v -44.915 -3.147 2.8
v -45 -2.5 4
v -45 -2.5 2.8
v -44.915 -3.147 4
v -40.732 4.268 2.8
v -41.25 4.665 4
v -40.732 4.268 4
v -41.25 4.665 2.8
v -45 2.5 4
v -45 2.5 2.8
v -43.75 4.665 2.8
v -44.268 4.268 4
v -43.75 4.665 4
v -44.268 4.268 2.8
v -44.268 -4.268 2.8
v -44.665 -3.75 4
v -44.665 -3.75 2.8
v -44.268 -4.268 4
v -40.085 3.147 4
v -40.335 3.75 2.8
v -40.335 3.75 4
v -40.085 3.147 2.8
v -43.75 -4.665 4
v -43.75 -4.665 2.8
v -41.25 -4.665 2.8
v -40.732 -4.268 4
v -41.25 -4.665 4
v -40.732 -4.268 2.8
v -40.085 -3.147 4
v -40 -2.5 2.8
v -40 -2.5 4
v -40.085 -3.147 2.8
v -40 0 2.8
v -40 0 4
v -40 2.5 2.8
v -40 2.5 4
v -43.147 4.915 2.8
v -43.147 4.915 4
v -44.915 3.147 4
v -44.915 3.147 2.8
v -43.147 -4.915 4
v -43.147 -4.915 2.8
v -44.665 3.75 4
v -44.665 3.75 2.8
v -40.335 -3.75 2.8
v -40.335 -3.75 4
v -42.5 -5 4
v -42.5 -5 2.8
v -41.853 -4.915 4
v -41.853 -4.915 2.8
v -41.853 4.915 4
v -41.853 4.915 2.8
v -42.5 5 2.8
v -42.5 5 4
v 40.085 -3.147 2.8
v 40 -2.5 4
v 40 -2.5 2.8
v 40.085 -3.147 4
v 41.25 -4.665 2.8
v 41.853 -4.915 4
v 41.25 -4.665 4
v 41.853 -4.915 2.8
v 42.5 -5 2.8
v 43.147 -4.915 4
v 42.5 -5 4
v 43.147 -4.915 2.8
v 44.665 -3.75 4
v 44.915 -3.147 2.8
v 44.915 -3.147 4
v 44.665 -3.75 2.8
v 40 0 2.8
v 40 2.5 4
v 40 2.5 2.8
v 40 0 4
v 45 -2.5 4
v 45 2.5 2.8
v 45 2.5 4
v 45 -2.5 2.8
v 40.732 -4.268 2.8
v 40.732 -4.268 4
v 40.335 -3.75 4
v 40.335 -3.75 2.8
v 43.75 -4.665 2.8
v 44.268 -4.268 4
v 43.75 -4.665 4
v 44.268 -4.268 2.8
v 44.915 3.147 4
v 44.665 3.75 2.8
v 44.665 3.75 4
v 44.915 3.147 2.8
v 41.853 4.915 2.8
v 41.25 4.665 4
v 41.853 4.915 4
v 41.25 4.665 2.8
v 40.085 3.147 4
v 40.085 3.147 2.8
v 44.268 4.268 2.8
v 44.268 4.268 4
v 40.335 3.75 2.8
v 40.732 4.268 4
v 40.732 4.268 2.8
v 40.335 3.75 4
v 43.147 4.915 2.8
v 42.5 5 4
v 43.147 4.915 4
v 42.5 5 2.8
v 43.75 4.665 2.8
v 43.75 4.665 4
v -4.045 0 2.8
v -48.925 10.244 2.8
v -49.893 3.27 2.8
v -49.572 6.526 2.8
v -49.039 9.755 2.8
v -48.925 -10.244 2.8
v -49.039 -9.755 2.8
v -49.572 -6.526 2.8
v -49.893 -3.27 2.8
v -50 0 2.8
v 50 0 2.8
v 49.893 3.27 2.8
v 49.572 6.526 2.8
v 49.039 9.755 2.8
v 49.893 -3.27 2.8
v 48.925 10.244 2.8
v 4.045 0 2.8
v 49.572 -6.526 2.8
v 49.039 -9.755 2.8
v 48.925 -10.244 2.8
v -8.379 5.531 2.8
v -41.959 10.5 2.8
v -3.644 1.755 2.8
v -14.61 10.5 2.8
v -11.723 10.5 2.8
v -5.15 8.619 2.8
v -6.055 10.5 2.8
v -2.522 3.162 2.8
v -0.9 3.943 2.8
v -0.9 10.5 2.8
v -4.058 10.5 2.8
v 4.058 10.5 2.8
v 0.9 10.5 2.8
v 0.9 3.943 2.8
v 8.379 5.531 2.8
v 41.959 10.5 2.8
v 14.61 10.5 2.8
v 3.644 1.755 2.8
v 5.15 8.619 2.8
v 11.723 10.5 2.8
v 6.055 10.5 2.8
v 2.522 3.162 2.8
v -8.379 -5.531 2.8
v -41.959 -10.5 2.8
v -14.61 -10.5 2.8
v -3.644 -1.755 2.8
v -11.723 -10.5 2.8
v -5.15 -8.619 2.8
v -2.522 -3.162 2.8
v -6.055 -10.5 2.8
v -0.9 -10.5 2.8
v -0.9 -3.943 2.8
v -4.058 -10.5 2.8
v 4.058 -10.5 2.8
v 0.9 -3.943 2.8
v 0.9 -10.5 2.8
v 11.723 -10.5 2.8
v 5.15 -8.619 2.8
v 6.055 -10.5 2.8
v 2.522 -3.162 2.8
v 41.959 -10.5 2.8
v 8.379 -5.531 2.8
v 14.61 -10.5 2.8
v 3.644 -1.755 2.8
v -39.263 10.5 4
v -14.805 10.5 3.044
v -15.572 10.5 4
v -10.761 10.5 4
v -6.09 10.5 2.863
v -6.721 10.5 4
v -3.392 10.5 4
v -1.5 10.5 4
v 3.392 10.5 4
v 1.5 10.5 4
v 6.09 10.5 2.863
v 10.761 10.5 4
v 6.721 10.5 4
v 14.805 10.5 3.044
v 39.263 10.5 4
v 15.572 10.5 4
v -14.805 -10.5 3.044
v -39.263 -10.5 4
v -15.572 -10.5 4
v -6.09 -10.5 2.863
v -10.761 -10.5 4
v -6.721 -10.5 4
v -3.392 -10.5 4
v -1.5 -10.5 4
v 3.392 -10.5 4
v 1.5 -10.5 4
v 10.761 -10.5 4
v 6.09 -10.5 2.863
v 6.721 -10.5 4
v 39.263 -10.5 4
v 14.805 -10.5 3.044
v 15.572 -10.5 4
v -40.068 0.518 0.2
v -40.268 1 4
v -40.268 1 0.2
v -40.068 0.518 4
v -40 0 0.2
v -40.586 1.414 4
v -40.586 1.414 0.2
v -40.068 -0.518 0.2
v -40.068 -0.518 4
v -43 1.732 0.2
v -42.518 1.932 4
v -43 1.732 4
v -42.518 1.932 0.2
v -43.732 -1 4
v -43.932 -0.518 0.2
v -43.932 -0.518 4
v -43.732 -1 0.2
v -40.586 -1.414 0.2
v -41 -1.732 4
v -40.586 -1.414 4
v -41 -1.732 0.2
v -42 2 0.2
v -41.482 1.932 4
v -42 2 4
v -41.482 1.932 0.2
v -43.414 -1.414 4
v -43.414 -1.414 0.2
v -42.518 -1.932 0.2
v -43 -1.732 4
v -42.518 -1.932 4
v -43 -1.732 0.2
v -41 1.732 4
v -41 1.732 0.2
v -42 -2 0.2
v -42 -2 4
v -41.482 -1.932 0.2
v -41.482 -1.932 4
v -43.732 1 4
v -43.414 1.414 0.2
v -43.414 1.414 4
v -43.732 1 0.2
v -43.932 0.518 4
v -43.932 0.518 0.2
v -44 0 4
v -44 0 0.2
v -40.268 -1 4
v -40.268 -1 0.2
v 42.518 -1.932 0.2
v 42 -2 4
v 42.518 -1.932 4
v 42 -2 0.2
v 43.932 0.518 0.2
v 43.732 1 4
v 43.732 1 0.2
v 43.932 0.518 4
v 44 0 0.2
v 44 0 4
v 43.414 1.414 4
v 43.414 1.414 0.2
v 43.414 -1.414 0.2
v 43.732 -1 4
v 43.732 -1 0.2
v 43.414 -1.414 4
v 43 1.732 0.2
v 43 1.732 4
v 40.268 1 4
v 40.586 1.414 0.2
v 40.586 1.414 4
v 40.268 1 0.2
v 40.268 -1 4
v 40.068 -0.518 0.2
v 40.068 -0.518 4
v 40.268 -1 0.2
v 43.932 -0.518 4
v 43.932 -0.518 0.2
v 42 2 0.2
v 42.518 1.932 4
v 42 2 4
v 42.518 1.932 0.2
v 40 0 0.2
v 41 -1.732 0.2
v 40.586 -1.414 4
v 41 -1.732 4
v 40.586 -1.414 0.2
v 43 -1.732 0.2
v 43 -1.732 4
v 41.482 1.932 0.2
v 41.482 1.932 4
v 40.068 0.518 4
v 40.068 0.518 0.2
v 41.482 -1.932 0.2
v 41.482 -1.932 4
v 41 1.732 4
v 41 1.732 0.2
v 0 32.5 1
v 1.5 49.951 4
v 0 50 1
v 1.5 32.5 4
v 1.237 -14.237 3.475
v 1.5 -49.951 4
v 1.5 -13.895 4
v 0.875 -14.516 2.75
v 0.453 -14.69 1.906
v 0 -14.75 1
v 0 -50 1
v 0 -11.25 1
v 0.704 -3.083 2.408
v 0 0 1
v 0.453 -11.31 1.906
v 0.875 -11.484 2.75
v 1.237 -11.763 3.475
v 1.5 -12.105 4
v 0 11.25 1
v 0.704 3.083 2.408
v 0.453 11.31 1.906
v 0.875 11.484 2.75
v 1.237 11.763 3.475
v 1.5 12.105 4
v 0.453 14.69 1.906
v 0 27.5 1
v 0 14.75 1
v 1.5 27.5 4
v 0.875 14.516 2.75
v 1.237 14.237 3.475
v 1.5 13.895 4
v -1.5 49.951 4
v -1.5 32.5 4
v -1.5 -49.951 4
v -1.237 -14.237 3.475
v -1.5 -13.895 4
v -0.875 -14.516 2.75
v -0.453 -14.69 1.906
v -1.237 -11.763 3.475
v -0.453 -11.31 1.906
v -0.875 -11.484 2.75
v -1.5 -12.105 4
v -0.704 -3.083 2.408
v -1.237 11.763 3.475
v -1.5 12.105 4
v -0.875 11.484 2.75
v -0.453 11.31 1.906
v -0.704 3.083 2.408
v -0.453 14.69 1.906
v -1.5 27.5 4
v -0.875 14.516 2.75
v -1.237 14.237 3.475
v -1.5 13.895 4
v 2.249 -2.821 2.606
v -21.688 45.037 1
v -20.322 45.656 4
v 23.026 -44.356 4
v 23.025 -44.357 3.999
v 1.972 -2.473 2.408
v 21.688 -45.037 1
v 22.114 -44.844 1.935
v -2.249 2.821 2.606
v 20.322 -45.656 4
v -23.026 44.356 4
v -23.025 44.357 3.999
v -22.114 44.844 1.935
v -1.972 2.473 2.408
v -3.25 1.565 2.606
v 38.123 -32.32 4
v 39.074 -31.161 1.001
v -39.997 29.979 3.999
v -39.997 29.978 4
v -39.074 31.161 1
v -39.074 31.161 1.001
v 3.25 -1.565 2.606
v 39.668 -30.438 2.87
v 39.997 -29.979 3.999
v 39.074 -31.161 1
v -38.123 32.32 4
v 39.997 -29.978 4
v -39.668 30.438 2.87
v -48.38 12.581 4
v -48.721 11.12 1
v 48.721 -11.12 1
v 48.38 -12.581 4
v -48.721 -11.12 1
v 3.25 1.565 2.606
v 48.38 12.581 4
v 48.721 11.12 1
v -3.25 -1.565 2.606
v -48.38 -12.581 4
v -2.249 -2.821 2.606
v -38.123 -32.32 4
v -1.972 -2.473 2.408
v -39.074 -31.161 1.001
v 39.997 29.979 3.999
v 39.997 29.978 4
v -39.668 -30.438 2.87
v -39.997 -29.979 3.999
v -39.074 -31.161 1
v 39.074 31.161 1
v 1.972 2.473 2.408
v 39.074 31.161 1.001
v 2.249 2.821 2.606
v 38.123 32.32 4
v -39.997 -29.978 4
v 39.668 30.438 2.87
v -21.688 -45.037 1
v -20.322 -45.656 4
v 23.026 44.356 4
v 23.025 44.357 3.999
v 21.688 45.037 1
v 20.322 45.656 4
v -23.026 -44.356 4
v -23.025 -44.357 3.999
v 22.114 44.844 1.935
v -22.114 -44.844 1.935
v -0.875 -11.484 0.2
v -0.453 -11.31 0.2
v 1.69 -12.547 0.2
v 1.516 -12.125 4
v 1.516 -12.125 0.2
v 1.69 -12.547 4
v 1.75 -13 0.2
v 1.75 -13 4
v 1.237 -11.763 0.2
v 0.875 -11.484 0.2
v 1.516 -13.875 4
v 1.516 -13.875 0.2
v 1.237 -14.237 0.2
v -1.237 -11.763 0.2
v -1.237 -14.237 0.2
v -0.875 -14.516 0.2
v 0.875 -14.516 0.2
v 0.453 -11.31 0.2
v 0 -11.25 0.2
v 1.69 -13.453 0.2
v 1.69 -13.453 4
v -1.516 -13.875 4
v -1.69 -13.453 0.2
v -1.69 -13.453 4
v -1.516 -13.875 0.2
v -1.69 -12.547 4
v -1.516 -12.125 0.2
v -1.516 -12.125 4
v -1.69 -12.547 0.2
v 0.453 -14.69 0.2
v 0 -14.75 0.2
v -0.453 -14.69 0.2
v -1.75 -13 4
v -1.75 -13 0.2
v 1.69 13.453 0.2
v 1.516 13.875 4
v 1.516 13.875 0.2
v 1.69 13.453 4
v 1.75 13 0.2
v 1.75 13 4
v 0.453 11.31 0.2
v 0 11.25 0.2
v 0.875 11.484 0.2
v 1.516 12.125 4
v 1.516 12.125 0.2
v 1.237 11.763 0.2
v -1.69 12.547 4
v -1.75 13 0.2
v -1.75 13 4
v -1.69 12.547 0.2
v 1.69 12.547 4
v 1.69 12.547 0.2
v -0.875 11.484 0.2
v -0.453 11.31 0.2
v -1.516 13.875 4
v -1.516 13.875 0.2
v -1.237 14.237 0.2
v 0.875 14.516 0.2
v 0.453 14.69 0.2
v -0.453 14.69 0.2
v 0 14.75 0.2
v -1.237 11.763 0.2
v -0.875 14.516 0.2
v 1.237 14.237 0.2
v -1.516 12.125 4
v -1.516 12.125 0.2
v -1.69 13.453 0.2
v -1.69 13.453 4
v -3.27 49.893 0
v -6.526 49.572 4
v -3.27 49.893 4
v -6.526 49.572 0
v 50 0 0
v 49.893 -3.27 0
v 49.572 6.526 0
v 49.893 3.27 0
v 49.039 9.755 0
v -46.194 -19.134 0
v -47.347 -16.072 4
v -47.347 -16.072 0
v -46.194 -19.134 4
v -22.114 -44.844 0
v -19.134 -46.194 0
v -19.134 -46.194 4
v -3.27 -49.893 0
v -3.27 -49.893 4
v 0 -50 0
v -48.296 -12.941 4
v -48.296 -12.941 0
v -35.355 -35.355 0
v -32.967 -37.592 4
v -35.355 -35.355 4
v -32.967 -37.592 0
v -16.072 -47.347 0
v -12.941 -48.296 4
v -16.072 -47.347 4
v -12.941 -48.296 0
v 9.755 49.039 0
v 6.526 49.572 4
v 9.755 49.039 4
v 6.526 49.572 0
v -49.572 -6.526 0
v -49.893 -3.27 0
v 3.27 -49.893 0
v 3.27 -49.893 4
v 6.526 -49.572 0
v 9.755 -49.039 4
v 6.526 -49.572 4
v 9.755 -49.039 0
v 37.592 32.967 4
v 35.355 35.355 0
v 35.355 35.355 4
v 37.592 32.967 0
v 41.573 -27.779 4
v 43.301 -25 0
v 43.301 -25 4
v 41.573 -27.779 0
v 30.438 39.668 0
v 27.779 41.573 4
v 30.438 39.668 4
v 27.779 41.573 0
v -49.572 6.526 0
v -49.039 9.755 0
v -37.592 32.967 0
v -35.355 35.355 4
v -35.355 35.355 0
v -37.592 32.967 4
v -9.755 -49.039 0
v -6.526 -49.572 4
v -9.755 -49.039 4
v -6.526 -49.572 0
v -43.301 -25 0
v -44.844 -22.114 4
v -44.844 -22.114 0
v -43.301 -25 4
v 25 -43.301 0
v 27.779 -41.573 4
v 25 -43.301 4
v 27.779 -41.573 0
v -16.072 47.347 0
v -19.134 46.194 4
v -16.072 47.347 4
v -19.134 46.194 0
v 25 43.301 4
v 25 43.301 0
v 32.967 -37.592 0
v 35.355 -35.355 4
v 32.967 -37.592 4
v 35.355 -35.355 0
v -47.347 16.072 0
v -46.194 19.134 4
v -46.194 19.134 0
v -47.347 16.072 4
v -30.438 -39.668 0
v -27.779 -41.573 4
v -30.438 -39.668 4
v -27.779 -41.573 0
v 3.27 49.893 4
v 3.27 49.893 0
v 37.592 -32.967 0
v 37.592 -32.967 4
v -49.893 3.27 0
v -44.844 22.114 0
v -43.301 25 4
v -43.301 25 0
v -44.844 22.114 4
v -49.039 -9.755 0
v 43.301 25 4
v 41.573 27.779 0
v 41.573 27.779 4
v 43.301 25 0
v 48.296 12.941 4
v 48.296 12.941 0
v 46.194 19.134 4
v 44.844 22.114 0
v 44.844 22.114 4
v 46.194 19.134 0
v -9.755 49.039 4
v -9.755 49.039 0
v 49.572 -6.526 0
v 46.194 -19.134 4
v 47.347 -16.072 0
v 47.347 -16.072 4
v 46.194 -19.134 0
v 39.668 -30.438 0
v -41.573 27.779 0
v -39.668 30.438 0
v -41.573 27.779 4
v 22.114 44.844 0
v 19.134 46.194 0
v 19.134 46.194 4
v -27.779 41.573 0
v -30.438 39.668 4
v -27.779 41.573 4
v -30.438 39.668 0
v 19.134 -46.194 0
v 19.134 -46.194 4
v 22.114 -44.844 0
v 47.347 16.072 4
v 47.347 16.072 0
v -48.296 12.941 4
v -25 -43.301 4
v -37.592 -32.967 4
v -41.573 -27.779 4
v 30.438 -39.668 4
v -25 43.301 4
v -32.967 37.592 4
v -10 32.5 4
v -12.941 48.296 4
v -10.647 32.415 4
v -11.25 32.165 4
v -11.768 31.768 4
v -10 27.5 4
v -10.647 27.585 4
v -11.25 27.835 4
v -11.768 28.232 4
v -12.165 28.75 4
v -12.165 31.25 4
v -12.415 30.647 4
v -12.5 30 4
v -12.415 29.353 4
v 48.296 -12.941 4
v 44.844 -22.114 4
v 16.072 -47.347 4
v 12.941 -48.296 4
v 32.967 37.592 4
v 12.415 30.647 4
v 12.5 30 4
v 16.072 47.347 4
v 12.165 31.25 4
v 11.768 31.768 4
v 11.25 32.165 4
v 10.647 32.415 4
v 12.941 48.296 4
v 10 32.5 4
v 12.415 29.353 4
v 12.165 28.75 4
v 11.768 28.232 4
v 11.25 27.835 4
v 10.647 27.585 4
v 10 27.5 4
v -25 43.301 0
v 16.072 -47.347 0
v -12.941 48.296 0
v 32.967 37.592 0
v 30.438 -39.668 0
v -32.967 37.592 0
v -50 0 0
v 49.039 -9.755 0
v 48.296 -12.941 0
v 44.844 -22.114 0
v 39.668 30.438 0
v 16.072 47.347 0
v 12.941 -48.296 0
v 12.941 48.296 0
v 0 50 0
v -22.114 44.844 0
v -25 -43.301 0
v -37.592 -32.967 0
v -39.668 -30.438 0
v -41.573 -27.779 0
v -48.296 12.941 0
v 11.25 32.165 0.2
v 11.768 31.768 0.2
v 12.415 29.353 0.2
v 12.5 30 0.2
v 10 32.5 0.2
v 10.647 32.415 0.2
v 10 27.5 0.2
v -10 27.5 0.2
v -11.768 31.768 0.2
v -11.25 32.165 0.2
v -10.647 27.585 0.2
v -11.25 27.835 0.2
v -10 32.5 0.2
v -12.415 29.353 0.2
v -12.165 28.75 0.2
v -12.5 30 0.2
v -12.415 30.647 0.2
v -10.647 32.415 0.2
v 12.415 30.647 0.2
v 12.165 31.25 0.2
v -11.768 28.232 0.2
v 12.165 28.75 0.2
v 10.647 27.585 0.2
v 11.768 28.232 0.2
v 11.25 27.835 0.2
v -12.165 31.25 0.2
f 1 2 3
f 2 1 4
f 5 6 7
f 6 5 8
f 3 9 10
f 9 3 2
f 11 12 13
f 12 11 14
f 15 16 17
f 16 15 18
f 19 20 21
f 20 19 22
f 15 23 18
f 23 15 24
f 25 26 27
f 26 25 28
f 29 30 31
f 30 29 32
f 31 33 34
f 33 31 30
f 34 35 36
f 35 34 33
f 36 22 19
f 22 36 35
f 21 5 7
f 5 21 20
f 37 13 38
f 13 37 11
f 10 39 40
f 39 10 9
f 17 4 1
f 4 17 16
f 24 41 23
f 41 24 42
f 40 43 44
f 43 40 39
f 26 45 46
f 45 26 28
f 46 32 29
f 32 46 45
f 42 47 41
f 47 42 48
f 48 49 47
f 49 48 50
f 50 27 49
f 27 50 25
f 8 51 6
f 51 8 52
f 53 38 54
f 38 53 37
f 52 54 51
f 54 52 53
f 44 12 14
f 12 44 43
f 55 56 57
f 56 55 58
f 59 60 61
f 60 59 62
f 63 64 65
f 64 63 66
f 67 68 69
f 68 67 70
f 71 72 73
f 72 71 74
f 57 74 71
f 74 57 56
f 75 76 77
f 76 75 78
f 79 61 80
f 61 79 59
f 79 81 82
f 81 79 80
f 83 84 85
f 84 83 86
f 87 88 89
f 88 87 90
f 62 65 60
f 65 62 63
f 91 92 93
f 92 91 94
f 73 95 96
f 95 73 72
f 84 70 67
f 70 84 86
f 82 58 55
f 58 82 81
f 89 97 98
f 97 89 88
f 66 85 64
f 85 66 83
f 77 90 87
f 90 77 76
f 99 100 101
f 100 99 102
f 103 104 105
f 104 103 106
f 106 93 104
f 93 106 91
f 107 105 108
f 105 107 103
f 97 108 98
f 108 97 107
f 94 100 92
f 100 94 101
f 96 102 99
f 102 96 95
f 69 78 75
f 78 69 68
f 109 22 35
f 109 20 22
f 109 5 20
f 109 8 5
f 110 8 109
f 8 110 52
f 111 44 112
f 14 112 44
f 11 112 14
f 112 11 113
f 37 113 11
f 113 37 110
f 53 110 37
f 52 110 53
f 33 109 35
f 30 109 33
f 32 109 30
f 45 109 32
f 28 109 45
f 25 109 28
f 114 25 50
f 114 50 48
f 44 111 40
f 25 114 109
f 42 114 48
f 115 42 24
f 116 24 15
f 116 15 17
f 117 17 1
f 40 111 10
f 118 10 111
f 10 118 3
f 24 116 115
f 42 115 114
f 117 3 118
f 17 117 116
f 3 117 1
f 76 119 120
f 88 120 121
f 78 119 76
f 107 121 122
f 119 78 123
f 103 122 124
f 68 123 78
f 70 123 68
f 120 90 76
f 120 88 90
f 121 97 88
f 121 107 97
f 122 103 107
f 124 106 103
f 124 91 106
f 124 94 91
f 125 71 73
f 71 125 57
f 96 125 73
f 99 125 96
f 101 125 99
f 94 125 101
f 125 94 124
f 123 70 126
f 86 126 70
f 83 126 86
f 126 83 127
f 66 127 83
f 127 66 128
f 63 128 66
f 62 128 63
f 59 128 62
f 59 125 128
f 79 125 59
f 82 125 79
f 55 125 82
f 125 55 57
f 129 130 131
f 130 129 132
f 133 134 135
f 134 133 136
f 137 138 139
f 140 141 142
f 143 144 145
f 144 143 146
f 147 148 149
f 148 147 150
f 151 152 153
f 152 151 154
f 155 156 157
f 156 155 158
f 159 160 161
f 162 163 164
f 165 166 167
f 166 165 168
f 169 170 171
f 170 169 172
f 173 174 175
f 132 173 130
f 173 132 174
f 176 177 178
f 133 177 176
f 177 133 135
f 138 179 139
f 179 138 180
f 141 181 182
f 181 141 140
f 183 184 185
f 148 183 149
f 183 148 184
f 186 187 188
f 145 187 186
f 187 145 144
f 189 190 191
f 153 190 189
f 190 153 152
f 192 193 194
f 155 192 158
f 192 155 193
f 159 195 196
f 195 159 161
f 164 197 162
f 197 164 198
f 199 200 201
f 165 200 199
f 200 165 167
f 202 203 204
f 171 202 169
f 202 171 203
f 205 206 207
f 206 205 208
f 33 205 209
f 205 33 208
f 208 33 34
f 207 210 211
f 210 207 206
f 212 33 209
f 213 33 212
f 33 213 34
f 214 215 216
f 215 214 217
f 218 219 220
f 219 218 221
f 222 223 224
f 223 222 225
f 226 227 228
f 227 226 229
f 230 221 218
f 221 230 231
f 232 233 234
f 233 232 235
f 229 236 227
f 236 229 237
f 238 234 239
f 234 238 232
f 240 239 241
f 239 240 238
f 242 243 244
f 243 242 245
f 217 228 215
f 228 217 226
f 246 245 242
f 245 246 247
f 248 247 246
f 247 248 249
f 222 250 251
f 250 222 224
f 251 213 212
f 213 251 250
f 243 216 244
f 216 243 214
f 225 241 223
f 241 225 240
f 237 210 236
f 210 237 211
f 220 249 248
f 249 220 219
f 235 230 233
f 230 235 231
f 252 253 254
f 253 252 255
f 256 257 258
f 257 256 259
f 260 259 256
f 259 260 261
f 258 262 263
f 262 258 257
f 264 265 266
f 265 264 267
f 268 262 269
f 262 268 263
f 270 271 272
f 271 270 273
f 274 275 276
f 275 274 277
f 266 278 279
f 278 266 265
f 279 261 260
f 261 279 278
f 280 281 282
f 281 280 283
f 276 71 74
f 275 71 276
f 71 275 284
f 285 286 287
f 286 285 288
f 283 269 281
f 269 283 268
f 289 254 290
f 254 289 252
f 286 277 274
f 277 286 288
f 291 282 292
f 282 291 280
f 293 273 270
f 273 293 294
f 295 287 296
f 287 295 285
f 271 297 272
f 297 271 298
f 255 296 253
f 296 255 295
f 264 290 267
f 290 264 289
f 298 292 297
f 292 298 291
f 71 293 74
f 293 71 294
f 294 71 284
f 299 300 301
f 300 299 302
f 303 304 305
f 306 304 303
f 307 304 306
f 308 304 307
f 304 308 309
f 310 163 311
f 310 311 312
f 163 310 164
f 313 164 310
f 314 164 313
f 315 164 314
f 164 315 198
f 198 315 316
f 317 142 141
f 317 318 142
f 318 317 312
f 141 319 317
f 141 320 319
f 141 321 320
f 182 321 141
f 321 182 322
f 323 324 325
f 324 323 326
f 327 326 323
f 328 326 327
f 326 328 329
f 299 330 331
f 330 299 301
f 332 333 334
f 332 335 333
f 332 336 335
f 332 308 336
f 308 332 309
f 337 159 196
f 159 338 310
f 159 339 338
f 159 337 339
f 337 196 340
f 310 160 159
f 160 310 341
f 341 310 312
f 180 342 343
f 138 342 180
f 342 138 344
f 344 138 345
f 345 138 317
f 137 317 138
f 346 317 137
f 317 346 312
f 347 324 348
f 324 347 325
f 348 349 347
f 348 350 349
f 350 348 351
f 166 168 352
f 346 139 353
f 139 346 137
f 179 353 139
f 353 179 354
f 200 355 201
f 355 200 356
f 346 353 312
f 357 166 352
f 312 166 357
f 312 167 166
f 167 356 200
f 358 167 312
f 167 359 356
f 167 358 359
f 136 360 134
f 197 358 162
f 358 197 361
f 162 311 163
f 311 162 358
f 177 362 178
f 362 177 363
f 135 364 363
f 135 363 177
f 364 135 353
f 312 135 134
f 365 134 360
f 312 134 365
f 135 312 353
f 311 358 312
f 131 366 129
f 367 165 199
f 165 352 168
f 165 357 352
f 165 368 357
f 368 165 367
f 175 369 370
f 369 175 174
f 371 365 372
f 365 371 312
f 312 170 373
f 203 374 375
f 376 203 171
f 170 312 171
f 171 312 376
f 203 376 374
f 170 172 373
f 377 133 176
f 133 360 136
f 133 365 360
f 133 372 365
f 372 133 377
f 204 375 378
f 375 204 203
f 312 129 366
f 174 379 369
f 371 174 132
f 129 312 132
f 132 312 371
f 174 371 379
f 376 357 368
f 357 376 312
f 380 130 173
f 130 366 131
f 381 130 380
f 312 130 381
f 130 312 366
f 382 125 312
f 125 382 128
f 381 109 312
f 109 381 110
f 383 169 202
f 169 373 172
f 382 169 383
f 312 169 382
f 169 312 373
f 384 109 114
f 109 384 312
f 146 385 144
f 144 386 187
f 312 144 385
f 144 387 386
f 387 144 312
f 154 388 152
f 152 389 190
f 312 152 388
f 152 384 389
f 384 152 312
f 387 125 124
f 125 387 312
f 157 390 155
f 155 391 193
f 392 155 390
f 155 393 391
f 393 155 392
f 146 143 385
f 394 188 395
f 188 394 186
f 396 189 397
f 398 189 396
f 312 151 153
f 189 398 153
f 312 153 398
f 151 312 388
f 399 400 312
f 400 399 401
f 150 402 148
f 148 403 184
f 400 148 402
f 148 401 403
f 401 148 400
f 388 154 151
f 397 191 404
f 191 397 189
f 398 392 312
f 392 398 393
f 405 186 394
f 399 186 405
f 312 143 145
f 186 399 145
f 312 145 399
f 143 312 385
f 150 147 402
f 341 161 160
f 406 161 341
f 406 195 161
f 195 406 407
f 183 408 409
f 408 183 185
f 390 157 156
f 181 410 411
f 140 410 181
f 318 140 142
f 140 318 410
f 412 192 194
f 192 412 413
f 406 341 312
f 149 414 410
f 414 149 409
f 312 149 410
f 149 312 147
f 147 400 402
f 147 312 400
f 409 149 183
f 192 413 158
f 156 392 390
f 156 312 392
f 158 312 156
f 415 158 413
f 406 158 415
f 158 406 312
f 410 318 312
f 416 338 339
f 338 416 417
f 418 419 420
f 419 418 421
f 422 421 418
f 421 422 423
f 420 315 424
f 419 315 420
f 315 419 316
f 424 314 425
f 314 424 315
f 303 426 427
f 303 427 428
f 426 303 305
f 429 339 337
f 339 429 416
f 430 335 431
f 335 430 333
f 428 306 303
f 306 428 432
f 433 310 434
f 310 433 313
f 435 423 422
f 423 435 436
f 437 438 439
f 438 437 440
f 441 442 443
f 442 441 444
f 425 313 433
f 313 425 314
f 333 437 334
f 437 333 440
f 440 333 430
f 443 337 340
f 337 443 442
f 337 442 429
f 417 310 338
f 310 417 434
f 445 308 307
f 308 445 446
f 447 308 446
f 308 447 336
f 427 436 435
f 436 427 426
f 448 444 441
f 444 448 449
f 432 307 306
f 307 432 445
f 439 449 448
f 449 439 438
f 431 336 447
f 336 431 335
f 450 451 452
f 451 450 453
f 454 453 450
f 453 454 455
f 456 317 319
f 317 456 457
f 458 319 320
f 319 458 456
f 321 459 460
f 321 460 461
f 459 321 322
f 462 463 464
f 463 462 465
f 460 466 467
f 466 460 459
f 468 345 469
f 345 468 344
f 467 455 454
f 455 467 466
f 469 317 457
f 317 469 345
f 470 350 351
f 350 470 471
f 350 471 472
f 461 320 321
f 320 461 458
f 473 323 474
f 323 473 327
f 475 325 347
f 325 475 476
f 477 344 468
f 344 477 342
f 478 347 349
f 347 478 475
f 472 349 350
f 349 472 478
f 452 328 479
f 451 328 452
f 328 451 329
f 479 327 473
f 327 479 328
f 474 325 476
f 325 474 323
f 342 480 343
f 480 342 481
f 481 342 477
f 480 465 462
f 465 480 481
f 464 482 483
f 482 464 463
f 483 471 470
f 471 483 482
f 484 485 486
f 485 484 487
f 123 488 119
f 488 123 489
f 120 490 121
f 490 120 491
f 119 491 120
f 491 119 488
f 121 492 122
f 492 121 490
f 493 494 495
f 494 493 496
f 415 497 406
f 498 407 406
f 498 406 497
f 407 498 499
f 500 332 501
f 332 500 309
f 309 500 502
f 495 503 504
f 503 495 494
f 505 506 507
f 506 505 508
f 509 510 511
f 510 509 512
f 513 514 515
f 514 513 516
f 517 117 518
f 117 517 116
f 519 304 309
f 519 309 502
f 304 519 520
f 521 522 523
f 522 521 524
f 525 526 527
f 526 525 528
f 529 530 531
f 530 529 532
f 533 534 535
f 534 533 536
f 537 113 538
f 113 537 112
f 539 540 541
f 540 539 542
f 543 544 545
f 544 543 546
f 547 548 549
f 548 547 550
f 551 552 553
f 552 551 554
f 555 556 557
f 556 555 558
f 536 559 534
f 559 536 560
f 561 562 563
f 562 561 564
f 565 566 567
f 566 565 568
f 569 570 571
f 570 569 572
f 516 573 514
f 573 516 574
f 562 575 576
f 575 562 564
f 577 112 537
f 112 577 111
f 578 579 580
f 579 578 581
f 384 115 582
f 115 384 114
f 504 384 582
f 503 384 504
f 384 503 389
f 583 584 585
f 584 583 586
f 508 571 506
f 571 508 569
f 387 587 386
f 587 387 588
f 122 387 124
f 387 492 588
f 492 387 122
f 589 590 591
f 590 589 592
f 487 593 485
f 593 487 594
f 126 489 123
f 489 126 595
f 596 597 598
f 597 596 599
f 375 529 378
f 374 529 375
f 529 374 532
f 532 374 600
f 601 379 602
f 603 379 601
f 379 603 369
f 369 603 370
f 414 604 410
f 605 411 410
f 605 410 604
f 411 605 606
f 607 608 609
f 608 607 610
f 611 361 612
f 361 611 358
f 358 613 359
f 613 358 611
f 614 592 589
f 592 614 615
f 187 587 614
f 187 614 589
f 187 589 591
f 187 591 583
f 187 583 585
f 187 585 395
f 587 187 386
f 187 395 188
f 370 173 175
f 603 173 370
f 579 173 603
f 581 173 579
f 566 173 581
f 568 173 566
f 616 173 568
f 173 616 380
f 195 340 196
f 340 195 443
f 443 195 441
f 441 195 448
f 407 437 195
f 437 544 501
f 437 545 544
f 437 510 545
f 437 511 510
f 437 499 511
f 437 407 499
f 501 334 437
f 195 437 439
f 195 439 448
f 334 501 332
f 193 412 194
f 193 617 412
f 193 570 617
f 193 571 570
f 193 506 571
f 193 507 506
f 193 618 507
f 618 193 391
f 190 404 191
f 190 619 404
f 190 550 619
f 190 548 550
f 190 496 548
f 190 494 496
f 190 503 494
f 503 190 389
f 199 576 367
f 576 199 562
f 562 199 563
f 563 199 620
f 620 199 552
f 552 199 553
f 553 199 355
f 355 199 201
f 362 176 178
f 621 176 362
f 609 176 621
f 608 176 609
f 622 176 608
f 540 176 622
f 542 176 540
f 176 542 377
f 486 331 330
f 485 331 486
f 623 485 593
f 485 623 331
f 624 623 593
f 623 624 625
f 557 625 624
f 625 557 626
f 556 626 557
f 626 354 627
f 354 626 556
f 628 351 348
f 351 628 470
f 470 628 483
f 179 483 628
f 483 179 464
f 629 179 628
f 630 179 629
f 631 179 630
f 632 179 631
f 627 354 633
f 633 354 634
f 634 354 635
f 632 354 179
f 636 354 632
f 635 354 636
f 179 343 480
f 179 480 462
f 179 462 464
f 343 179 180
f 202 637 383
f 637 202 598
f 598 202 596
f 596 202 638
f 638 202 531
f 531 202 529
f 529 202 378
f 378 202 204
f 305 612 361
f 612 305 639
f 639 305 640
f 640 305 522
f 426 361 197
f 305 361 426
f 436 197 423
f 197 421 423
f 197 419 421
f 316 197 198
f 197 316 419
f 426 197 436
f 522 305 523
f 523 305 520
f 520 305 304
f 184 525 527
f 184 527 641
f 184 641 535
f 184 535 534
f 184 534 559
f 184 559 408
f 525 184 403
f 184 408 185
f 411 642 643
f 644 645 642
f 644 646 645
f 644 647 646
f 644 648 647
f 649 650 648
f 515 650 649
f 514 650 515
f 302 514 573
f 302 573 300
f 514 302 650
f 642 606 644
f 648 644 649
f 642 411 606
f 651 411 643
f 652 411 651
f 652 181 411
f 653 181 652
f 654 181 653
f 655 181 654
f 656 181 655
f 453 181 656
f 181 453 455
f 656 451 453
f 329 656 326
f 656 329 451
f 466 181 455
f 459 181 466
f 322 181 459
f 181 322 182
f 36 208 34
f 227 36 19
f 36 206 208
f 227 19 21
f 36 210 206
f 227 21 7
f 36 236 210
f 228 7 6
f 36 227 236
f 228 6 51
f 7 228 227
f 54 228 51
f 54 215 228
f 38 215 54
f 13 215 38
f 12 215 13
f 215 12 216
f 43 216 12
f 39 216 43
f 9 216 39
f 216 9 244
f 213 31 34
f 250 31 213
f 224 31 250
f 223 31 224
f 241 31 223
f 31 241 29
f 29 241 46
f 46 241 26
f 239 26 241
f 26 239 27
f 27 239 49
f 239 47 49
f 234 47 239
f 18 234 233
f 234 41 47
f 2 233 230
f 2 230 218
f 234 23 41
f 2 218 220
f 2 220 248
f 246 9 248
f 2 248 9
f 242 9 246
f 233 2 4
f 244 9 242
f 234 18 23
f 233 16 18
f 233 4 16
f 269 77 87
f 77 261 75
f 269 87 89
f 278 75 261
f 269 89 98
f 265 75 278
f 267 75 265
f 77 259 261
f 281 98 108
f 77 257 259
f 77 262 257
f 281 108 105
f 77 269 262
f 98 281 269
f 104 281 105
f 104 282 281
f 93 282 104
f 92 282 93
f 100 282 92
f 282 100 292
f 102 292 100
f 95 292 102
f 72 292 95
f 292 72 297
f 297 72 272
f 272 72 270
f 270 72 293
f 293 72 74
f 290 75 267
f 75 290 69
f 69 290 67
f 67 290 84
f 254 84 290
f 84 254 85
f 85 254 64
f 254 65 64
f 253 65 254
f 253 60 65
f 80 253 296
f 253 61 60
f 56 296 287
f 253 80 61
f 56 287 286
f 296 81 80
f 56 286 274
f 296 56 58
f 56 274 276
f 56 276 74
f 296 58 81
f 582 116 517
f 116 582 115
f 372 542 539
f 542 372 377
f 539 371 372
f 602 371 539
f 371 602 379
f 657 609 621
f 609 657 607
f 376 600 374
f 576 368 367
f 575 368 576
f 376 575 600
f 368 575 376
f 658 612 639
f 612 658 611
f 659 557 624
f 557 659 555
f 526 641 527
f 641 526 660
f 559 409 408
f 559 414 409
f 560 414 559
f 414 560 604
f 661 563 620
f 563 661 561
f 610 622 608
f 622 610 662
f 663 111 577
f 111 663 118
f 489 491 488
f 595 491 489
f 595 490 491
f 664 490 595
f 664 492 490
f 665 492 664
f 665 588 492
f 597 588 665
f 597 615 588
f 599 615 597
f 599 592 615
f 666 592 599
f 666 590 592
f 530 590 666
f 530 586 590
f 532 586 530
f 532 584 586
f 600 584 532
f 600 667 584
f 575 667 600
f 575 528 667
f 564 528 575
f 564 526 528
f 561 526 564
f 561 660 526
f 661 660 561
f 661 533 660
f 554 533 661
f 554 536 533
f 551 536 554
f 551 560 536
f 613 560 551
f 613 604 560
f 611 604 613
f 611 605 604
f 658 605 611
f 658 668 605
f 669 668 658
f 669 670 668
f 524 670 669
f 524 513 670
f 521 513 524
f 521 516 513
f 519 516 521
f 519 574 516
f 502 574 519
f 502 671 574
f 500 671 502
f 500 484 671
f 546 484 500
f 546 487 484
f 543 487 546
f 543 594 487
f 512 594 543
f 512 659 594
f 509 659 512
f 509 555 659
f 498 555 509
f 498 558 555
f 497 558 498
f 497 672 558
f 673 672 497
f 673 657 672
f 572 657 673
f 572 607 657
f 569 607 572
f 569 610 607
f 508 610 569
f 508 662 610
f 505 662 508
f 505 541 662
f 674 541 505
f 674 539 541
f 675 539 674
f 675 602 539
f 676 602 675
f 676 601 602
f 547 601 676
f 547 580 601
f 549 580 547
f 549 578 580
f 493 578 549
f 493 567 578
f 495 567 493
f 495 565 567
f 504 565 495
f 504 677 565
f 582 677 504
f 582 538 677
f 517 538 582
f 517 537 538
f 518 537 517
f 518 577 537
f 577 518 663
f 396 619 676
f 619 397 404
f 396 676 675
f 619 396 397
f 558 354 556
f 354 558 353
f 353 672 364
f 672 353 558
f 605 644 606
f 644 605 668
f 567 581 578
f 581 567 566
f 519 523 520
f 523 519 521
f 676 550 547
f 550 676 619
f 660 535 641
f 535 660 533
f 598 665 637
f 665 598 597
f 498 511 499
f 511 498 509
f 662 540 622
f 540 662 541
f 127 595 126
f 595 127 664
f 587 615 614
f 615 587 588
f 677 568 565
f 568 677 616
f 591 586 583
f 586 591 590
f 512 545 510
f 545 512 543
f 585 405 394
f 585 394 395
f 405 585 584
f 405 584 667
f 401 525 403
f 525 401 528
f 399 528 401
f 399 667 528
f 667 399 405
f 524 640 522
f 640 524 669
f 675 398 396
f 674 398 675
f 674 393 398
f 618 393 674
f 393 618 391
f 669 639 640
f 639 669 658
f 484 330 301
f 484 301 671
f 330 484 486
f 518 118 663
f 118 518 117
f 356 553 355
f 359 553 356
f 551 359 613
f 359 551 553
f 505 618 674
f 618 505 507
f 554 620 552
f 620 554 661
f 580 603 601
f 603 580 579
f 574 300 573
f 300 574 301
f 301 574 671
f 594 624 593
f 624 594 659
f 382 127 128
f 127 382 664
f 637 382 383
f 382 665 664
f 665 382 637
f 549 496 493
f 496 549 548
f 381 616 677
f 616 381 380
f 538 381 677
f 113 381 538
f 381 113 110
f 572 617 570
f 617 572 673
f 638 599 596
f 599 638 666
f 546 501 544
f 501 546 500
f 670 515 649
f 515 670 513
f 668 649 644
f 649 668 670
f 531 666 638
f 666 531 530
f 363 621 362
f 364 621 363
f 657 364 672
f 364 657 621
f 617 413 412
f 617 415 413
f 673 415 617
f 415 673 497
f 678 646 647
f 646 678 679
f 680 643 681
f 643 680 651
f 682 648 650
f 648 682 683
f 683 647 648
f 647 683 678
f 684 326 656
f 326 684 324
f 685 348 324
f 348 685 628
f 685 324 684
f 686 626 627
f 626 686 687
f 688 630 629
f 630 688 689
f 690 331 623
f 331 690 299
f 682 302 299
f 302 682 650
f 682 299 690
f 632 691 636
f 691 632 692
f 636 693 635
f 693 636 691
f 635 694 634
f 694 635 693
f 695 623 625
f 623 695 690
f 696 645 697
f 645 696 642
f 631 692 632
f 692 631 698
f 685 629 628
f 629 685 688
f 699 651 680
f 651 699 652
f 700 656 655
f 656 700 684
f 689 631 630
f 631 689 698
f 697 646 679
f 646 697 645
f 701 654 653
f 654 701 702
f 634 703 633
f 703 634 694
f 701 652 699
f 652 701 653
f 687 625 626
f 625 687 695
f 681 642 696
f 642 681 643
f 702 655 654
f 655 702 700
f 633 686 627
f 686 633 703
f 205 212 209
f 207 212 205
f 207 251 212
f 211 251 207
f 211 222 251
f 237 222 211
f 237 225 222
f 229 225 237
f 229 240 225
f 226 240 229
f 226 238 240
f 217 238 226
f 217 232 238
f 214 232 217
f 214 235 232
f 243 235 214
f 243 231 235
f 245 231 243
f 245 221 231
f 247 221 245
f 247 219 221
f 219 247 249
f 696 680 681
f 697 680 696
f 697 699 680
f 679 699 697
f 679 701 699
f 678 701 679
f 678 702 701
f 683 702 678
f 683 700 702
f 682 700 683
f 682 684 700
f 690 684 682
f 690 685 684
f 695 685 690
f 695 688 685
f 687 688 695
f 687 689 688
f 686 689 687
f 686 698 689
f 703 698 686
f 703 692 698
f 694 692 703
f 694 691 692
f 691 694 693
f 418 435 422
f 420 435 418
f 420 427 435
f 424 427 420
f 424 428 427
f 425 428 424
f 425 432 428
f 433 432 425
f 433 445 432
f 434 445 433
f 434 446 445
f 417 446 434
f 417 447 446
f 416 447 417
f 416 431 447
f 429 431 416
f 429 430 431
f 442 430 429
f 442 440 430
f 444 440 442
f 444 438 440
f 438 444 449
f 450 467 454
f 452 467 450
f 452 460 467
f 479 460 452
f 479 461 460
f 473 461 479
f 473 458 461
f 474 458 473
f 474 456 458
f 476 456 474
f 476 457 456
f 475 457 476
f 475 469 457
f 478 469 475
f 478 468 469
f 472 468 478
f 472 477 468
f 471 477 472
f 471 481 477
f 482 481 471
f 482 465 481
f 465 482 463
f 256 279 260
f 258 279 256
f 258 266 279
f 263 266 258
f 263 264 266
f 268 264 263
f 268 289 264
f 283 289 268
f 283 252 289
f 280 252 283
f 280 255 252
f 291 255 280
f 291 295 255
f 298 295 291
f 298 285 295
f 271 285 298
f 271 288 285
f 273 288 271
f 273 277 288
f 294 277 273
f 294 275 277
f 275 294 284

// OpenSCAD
// file: ../OpenSCAD_Modules/cube_vround.scad
module cube_vround(
	size=[10,10,10],
	round_corners=[true,true,true,true],
	rounding=3,
	center_xy=false,
	center_z=false,
	attach=0,
	wall_attach=0,
	quality=2, //integer from 1 to infinity
)
{
	assert(len(size)==3);
	assert(len(round_corners)==4);
	assert(rounding>0);
	assert(rounding<=size[0]/2);
	assert(rounding<=size[1]/2);
	assert(quality>0);
	assert(attach>=0);
	assert(wall_attach>=0);
	height=size[2]+attach;
	cyl_r=rounding+wall_attach;
	cyl_mvx=size[0]/2-rounding;
	cyl_mvy=size[1]/2-rounding;
	cube_szx=size[0]/2;
	cube_szy=size[1]/2;
	cube_mvx=cube_szx/2+wall_attach;
	cube_mvy=cube_szy/2+wall_attach;
	translate([center_xy?0:cube_szx,center_xy?0:cube_szy,center_z?-attach/2:(size[2]-attach)/2])
		hull()
		{
			if(round_corners[0])
				translate([cyl_mvx,cyl_mvy])
					cylinder(r=cyl_r,h=height,$fn=12*quality,center=true);
			else
				translate([cube_mvx,cube_mvy])
					cube([cube_szx,cube_szy,height],center=true);
			if(round_corners[1])
				translate([cyl_mvx,-cyl_mvy])
					cylinder(r=cyl_r,h=height,$fn=12*quality,center=true);
			else
				translate([cube_mvx,-cube_mvy])
					cube([cube_szx,cube_szy,height],center=true);
			if(round_corners[2])
				translate([-cyl_mvx,-cyl_mvy])
					cylinder(r=cyl_r,h=height,$fn=12*quality,center=true);
			else
				translate([-cube_mvx,-cube_mvy])
					cube([cube_szx,cube_szy,height],center=true);
			if(round_corners[3])
				translate([-cyl_mvx,cyl_mvy])
					cylinder(r=cyl_r,h=height,$fn=12*quality,center=true);
			else
				translate([-cube_mvx,cube_mvy])
					cube([cube_szx,cube_szy,height],center=true);
		};
}

//example
cube_vround(round_corners=[true,false,true,false],
size=[10,20,6],
attach=0.1,
wall_attach=0.1,
rounding=3,
center_xy=true,center_z=false);
// main file
use <../OpenSCAD_Modules/cube_vround.scad>

module HNut
(
	nutDiam=6.75,
	nutHeight=3,
)
{
	cylinder(d=nutDiam,h=nutHeight,center=false,$fn=6);
}

module Plate
(
	ext_diameter=100,
	base_height=4,
	pwr_wires_cut_size=[20,5,30],
	metal_bar_size=[21,1.2],
	metal_bar_clips=[5,5,85],
	clip_wires_cut_diam=4,
	stiffener_rays_count=7,
	stiffener_rays_size=[3,3,90],
	screw_diam=3.5,
	screw_diff=26,
	quality=2,
	stub_layer_size=0.2,
)
{
	cutClr=1;
	union()
	{
		difference()
		{
			//base
			cylinder(h=base_height,d=ext_diameter,center=false,$fn=48*quality);
			//wires_cut
			hull()
			{
				translate([-pwr_wires_cut_size[0]/2,pwr_wires_cut_size[2],-cutClr])
				cylinder(h=base_height+2*cutClr,d=pwr_wires_cut_size[1],center=false,$fn=12*quality);
				translate([pwr_wires_cut_size[0]/2,pwr_wires_cut_size[2],-cutClr])
				cylinder(h=base_height+2*cutClr,d=pwr_wires_cut_size[1],center=false,$fn=12*quality);
			}
			translate([0,0,(metal_bar_size[1]+cutClr)/2+base_height-metal_bar_size[1]])
			{
				difference()
				{
					//metal bar top cut
					cube(size=[ext_diameter*2,metal_bar_size[0],metal_bar_size[1]+cutClr],center=true);
					//metal_bar_clips
					for(i=[-1,1])
					{
						hull()
						{
							translate([i*metal_bar_clips[2]/2,-metal_bar_clips[1]/2,0])
							cylinder(h=metal_bar_size[1]+2*cutClr,d=metal_bar_clips[0],center=true,$fn=12*quality);
							translate([i*metal_bar_clips[2]/2,metal_bar_clips[1]/2,0])
							cylinder(h=metal_bar_size[1]+2*cutClr,d=metal_bar_clips[0],center=true,$fn=12*quality);
						}
					}
				}
			}
			//metal bar clip wires
			for(i=[-1,1])
			{
				translate([i*(metal_bar_clips[2]/2-metal_bar_clips[0]/2+clip_wires_cut_diam/2),0,-cutClr])
				cylinder(h=base_height+2*cutClr,d=clip_wires_cut_diam,center=false,$fn=12*quality);
			}
			//stiffener rays
			for(i=[0:1:stiffener_rays_count-1])
			{
				rotate(a=i*(180/stiffener_rays_count),v=[0,0,1])
				rotate(a=90,v=[1,0,0])
				linear_extrude(h=stiffener_rays_size[2],center=true)
				polygon(points=[
					[0,-stiffener_rays_size[1]+base_height],
					[-stiffener_rays_size[0]/2,base_height],
					[-stiffener_rays_size[0]/2,cutClr+base_height],
					[stiffener_rays_size[0]/2,cutClr+base_height],
					[stiffener_rays_size[0]/2,base_height],
				]);
			}
			//screw holes
			for(i=[-1,1])
			{
				translate([0,i*(screw_diff/2),-cutClr])
				cylinder(h=base_height+2*cutClr,d=screw_diam,center=false,$fn=12*quality);
			}
		}

		//stub layer
		cylinder(h=stub_layer_size,d=ext_diameter,center=false,$fn=48*quality);
	}
}

module TopClip
(
	ext_diameter=40,
	base_height=4,
	screw_diam=3.5,
	screw_diff=26,
	quality=2,
	stub_layer_size=0.2,
)
{
	cutClr=1;
	union()
	{
		difference()
		{
			//base
			cylinder(h=base_height,d=ext_diameter,center=false,$fn=48*quality);
			//screw holes
			for(i=[-1,1])
			{
				translate([0,i*(screw_diff/2),-cutClr])
				cylinder(h=base_height+2*cutClr,d=screw_diam,center=false,$fn=12*quality);
			}
		}
		//stub layer
		cylinder(h=stub_layer_size,d=ext_diameter,center=false,$fn=48*quality);
	}
}

module BackPlate
(
	backplate_size=[85,34],
	center_cut_size=[18,2],
	rounding=2,
	base_height=5,
	screw_diam=3.5,
	screw_diff=26,
	nut_height=2,
	side_screw_diam=3,
	side_screw_pos=[80,3],
	quality=2,
	stub_layer_size=0.2,
)
{
	cutClr=1;
	union()
	{
		difference()
		{
			//base
			cube_vround(size=[backplate_size[0],backplate_size[1],base_height],rounding=rounding,center_xy=true);
			//screw holes
			for(i=[-1,1])
			{
				translate([0,i*(screw_diff/2),-cutClr])
				cylinder(h=base_height+2*cutClr,d=screw_diam,center=false,$fn=12*quality);
				
				translate([0,i*(screw_diff/2),base_height-nut_height])
				HNut(nutHeight=base_height);
			}
			//center cut
			translate([-backplate_size[0],-center_cut_size[0]/2,base_height-center_cut_size[1]])
			cube(size=[backplate_size[0]*2,center_cut_size[0],base_height]);
			//side cuts
			for(i=[-1,1])
			{
				translate([i*(side_screw_pos[0]/2-side_screw_diam/2),0,side_screw_pos[1]])
				rotate(a=90,v=[1,0,0])
				cylinder(h=backplate_size[1]+2*cutClr,d=side_screw_diam,center=true,$fn=12*quality);

				translate([i*(backplate_size[0]/2),0,-cutClr])
				cube_vround(size=[(backplate_size[0]-side_screw_pos[0]),center_cut_size[0],base_height+2*cutClr],rounding=rounding,center_xy=true);
			}
		}
		//stub layer
		cube_vround(size=[backplate_size[0],backplate_size[1],stub_layer_size],rounding=rounding,center_xy=true);
	}
}

if($preview)
{
	Plate(stub_layer_size=0);

	translate([0,0,4])
	color([0.75, 1, 0.75, 0.5])
	render()
	TopClip(stub_layer_size=0);

	rotate(a=180,v=[1,0,0])
	color([1, 0.75, 0.75, 0.5])
	render()
	BackPlate(stub_layer_size=0);
}
else
{
	Plate();
	//TopClip();
	//BackPlate();
}
